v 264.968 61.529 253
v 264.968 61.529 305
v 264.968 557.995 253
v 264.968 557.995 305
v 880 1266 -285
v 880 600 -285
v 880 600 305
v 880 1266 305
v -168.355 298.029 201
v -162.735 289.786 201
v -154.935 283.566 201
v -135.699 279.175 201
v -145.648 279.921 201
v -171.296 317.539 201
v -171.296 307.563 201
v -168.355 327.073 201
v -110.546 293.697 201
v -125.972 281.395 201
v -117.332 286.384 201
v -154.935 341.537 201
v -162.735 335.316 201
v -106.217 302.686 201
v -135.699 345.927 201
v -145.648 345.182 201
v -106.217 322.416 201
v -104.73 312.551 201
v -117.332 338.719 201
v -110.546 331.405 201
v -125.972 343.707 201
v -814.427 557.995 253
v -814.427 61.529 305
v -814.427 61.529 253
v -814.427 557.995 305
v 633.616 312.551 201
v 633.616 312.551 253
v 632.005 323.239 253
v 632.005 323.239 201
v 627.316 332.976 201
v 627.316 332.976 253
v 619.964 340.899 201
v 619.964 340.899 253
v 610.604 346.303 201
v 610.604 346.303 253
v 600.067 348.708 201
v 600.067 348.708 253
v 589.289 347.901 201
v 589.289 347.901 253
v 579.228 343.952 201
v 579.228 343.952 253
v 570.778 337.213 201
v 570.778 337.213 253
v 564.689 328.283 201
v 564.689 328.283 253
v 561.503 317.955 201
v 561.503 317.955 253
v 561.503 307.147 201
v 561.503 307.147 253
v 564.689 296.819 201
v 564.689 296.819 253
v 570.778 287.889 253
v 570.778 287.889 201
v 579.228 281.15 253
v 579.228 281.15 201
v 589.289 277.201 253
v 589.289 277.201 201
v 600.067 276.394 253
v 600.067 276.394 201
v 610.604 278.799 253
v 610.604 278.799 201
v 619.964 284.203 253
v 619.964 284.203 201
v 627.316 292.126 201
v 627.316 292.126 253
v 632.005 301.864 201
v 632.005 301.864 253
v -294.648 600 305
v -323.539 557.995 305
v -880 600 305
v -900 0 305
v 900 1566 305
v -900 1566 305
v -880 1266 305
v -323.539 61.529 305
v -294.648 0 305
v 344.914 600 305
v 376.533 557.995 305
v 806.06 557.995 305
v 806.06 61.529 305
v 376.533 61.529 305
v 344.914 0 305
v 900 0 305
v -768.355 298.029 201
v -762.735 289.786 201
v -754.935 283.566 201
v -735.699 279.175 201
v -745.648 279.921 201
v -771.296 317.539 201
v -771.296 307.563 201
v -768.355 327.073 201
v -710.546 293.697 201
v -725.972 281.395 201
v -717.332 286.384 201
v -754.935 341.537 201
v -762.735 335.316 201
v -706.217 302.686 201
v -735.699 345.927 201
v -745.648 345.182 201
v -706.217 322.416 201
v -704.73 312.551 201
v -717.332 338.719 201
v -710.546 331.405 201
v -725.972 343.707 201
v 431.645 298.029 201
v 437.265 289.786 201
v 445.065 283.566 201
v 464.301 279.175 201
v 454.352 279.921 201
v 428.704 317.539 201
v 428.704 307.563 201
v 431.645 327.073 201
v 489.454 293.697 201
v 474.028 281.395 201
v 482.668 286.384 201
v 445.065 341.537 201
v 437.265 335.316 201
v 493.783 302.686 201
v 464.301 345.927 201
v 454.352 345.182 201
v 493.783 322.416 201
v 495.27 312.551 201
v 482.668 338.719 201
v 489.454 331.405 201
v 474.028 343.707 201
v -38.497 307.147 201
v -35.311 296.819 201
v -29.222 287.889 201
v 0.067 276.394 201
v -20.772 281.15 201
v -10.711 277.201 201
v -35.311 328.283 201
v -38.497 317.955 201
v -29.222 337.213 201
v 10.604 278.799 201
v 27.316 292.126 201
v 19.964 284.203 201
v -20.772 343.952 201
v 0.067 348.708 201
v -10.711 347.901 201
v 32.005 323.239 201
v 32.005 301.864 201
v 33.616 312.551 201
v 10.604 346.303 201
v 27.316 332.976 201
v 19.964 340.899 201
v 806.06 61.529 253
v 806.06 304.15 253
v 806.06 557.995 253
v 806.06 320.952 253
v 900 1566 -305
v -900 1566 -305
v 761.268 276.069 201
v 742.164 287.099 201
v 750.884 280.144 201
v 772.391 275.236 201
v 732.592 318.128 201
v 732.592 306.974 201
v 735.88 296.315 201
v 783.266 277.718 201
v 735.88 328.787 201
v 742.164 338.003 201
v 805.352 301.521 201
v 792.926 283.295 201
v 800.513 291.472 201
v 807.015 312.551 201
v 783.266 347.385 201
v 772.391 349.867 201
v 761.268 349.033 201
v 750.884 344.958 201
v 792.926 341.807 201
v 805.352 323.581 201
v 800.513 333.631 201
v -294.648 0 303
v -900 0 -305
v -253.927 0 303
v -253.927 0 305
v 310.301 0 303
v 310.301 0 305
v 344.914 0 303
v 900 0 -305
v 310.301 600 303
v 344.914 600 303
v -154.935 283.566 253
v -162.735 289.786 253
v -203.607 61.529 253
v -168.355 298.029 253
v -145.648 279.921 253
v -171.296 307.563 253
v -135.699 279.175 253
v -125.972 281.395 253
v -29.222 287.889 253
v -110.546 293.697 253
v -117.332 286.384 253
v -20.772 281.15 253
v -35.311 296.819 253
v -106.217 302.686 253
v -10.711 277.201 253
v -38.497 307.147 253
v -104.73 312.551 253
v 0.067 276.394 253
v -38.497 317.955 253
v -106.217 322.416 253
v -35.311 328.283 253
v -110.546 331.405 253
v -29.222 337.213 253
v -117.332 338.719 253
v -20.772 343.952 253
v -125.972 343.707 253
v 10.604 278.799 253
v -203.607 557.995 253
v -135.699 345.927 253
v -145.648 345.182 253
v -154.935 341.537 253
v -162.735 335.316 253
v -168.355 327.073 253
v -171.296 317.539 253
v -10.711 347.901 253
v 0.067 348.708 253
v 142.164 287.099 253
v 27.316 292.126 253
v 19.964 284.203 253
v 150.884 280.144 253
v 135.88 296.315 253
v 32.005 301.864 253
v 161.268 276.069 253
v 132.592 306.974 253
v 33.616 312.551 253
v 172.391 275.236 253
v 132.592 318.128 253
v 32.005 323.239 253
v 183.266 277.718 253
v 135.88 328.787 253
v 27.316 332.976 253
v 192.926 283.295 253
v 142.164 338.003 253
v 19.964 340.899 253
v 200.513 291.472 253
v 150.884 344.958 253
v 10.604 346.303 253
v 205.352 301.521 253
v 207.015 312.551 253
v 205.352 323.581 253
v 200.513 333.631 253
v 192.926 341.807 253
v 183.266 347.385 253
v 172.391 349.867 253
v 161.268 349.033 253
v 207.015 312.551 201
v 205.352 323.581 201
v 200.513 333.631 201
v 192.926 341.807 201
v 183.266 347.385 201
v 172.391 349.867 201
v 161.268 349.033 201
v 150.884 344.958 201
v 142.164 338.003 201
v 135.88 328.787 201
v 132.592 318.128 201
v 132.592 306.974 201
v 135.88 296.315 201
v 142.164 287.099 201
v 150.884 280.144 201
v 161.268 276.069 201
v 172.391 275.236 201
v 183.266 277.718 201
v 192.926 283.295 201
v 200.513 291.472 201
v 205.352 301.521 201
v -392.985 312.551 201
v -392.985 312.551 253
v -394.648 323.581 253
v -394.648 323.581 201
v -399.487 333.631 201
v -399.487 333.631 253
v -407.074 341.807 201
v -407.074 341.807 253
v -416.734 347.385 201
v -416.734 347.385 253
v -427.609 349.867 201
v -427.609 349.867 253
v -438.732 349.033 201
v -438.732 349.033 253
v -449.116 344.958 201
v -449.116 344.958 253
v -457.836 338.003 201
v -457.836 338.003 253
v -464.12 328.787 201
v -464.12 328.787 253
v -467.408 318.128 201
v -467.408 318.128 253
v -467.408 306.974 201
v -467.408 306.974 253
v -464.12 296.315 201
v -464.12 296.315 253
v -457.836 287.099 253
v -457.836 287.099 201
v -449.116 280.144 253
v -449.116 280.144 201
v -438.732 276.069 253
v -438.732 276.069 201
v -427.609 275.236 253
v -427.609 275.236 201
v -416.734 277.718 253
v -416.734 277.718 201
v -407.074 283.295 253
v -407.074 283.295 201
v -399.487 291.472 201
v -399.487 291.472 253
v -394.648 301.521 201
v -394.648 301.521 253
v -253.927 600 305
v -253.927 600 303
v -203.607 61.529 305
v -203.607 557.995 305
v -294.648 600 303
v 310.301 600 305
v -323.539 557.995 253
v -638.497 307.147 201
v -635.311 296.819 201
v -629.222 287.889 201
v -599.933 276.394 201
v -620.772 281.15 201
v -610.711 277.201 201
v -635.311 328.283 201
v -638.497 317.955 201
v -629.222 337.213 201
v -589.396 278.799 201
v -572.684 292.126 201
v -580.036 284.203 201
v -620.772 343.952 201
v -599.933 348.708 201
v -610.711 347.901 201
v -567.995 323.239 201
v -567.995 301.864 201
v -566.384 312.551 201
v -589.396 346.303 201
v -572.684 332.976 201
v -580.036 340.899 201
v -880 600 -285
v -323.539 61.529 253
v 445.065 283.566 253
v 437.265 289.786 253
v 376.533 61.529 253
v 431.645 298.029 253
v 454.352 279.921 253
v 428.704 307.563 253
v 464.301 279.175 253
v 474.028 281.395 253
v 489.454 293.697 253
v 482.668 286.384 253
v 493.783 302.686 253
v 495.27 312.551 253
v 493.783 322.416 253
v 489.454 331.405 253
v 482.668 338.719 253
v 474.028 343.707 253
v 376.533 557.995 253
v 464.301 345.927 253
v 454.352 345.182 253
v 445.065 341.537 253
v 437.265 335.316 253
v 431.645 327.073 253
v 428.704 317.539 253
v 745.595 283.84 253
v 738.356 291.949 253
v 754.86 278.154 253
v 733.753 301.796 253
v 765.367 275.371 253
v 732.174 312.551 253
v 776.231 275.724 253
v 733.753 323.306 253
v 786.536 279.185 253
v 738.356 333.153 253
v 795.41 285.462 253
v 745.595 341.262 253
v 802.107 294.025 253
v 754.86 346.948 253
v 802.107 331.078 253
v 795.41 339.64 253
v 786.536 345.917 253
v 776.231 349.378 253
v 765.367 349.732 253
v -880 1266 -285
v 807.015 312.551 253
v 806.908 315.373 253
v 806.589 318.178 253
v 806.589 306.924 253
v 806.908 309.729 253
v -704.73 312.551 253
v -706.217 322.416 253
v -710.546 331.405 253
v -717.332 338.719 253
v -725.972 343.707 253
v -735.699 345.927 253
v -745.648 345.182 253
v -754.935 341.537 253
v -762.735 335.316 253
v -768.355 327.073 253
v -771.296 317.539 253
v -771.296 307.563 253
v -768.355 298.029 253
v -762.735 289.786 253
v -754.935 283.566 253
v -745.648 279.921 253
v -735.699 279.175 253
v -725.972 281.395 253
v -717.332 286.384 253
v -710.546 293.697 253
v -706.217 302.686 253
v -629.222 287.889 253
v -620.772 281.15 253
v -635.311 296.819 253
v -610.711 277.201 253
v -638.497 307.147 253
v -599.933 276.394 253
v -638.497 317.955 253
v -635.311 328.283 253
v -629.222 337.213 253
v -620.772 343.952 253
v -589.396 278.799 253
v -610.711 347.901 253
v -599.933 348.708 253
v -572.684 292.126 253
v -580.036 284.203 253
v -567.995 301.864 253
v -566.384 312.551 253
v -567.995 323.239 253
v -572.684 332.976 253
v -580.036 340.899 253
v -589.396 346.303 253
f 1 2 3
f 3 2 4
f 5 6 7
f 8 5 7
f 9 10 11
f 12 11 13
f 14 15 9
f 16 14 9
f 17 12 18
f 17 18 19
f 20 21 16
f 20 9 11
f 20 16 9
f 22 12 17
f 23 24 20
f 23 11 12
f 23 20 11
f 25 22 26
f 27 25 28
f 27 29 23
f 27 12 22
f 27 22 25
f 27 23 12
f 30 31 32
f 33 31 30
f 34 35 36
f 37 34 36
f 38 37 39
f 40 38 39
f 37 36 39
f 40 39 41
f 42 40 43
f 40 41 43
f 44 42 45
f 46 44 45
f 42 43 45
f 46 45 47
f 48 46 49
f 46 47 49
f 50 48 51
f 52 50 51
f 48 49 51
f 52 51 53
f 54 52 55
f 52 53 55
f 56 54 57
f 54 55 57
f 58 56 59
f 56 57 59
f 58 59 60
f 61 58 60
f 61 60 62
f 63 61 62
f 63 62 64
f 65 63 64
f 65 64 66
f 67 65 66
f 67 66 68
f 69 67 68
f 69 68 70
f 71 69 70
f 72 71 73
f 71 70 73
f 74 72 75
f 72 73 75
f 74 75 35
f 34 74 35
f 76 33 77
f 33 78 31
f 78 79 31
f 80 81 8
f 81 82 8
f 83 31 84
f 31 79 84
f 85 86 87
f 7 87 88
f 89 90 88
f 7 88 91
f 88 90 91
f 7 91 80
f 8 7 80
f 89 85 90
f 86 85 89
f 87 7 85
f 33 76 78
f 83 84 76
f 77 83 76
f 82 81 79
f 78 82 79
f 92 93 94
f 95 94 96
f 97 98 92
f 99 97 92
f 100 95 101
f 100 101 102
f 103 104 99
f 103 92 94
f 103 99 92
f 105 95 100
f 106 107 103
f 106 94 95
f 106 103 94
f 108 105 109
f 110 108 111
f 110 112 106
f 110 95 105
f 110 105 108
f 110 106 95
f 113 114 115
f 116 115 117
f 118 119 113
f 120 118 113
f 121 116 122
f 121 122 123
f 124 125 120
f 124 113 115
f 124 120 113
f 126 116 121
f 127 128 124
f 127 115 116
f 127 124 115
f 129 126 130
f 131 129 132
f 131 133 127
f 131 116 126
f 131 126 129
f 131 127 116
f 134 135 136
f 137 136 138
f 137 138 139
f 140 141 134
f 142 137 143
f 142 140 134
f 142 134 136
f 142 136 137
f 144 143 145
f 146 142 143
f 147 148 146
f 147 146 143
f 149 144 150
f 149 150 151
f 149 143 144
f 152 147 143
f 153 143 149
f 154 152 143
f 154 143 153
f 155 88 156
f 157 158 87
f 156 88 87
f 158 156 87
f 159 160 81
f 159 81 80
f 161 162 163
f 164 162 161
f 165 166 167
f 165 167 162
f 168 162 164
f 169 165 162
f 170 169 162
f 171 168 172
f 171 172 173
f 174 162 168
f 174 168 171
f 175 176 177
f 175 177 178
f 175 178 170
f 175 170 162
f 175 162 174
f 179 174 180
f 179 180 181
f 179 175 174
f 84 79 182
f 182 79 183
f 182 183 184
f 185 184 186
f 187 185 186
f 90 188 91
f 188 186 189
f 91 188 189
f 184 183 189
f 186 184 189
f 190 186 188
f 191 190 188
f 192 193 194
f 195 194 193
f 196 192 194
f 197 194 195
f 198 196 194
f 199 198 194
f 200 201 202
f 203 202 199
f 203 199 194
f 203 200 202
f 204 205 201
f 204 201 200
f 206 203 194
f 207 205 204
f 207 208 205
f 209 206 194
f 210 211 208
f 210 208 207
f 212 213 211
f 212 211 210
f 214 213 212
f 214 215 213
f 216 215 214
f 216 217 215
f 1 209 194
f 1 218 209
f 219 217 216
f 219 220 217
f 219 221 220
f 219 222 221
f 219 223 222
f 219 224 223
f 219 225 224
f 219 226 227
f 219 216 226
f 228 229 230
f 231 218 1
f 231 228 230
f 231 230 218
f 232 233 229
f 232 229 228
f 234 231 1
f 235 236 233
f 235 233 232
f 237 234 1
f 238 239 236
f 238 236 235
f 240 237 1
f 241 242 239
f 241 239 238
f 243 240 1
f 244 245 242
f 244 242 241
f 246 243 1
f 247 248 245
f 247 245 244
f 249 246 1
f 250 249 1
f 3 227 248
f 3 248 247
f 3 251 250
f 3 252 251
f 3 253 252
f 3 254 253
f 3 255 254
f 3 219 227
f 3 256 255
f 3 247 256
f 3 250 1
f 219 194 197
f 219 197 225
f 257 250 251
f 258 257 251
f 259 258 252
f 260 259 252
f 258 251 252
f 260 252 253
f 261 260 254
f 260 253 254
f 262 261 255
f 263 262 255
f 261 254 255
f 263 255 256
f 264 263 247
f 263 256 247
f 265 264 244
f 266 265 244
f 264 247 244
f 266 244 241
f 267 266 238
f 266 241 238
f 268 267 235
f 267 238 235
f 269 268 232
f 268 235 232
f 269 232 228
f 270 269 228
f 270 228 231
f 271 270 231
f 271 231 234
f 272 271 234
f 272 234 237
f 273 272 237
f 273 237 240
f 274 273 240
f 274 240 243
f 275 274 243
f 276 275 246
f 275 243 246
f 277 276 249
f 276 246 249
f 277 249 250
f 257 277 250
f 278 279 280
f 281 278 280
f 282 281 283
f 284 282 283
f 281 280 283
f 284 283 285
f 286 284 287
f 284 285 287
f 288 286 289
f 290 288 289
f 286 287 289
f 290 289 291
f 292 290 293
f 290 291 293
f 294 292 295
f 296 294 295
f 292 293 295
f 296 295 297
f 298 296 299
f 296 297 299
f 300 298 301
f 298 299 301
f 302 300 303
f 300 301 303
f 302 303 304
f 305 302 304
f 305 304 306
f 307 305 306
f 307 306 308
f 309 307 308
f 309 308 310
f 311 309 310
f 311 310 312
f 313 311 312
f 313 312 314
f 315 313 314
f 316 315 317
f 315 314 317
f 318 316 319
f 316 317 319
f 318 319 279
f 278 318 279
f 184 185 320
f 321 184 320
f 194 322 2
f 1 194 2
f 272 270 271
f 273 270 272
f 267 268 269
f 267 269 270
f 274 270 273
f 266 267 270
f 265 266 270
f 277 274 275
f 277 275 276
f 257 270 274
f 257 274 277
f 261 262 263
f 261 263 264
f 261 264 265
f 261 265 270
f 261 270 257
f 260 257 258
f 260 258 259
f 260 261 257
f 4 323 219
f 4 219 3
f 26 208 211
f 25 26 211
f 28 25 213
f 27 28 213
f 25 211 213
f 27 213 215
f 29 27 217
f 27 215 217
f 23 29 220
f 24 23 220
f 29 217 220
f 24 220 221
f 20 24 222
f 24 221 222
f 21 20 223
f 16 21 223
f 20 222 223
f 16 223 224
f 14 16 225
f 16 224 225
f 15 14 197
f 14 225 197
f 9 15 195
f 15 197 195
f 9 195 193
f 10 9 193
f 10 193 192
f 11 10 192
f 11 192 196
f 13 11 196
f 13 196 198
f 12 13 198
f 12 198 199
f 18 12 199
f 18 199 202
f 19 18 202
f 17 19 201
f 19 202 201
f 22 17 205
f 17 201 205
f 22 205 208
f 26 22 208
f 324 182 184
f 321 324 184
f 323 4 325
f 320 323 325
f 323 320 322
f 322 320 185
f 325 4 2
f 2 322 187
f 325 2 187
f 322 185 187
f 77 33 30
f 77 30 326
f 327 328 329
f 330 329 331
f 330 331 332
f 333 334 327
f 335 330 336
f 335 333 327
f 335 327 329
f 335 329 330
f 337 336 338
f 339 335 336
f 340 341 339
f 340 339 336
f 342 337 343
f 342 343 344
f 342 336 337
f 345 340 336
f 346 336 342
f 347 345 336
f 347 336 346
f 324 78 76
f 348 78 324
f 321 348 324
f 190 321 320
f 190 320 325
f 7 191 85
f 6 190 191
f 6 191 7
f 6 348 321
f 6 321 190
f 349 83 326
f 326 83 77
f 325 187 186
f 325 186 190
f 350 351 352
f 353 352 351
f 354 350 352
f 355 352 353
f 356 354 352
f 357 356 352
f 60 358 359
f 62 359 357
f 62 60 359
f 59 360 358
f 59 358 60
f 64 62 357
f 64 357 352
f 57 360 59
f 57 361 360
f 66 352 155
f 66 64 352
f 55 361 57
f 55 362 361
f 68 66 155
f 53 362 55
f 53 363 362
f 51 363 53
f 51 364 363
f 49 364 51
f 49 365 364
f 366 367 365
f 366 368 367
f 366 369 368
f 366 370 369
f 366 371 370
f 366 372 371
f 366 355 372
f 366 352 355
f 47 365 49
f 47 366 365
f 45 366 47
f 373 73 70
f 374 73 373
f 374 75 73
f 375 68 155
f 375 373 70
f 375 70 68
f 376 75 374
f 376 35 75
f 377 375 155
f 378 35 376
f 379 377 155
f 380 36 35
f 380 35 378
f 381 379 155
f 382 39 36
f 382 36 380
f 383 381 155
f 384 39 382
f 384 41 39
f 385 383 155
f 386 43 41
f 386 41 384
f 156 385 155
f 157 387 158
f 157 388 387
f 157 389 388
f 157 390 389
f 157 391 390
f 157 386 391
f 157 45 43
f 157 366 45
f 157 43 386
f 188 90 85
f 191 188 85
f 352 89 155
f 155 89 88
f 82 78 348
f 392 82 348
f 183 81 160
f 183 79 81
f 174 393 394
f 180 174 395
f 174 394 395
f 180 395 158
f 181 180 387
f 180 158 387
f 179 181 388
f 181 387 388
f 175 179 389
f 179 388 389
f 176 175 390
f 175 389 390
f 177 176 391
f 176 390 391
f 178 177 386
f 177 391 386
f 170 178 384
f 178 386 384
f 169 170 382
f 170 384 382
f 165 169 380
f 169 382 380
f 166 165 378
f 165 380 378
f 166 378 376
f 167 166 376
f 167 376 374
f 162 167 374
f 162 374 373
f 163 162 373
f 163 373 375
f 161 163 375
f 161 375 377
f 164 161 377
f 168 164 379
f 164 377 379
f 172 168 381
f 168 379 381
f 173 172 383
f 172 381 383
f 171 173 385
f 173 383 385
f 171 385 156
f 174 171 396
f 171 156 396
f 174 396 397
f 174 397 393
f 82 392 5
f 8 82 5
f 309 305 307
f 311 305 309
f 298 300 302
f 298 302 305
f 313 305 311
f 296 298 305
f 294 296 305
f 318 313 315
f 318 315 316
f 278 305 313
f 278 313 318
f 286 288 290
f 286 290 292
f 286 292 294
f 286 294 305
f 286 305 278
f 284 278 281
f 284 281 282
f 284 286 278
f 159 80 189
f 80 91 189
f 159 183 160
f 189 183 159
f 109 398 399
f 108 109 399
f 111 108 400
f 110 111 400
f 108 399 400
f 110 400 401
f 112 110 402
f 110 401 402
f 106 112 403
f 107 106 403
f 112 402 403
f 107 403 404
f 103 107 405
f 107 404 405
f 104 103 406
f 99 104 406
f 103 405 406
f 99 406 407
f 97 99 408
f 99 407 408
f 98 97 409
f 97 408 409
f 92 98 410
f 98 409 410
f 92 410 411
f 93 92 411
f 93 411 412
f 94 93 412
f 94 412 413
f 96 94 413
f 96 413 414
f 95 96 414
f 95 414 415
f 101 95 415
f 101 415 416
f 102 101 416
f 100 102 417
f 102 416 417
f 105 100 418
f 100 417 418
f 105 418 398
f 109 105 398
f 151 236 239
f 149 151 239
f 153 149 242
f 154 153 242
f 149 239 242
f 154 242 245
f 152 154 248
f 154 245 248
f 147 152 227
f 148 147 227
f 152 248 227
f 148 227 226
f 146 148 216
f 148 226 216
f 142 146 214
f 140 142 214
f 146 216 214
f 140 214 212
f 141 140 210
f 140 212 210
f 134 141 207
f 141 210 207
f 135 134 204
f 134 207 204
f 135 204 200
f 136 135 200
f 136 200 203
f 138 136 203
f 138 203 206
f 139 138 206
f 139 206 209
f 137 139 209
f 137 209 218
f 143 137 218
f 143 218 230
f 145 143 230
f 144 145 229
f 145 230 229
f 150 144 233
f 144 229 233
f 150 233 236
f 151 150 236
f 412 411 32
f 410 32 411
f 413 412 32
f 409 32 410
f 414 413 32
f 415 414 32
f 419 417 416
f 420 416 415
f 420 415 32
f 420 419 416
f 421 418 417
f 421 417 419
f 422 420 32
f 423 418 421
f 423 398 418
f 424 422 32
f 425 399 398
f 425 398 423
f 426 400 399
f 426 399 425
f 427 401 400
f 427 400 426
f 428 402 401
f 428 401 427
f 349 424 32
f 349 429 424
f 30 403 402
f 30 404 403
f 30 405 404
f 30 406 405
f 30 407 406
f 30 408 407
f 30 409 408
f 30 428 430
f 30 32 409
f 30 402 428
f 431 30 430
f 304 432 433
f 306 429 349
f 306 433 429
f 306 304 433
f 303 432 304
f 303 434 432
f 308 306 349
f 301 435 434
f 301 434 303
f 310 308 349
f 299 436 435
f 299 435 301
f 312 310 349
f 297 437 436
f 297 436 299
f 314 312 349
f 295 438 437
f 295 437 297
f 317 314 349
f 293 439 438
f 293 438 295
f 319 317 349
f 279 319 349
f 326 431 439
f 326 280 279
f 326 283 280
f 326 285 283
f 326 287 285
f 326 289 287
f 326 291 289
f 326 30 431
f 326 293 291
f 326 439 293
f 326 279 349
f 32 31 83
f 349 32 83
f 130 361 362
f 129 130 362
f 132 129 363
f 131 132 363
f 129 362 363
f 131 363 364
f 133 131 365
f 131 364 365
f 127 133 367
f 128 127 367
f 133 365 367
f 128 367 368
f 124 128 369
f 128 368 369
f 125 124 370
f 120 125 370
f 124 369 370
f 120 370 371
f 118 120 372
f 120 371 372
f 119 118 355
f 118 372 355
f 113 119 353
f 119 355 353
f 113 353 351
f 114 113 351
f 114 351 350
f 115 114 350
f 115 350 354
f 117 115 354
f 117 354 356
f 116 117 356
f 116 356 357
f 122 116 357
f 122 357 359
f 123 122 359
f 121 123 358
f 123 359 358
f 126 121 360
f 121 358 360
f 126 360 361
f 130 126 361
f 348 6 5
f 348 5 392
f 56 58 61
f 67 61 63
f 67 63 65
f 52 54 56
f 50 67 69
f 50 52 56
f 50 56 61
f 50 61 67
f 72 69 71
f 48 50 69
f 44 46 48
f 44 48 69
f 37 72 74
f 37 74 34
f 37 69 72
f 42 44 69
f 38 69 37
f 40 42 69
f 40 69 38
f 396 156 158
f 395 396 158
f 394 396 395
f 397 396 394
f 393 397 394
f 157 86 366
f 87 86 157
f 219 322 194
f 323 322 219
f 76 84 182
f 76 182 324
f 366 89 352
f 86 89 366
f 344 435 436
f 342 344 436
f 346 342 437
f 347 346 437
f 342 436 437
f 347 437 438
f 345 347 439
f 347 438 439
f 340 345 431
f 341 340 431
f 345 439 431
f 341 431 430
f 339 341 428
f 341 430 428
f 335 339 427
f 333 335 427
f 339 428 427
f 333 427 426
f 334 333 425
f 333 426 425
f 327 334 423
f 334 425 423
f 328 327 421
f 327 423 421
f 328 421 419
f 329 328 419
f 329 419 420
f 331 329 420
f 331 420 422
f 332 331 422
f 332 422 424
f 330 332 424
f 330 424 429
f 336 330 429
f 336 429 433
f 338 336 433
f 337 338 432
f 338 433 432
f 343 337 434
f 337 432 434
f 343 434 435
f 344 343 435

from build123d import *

# Parameters (mm, degrees)
CROQUIS1_W              = 1800
CROQUIS1_H              = 610
SALIENTE_EXTRUIR1_DEPTH = 600
CROQUIS2_W              = 40.721486725
CROQUIS2_H              = 600
CROQUIS2_W_2            = 34.613400616
CORTAR_EXTRUIR1_DEPTH   = 2
CROQUIS3_W              = 490.887470824
CROQUIS3_H              = 496.465737538
CROQUIS3_W_2            = 468.574403969
CROQUIS3_W_3            = 429.526536971
CORTAR_EXTRUIR2_DEPTH   = 52
CROQUIS4_R              = 33.469600283
CROQUIS4_R_2            = 36.25873364
CROQUIS4_R_3            = 37.420150707
CORTAR_EXTRUIR3_DEPTH   = 52
MATRIZL1_COUNT          = 3
MATRIZL1_PITCH          = 600
SALIENTE_EXTRUIR2_DEPTH = 666
CROQUIS6_W              = 1800
CROQUIS6_H              = 610
SALIENTE_EXTRUIR3_DEPTH = 300


with BuildPart() as part:
    # Croquis1 → Saliente-Extruir1 (new body)
    with BuildSketch(Plane(origin=(0, 0, 0), x_dir=(1, 0, 0), z_dir=(0, 1, 0))):
        Rectangle(CROQUIS1_W, CROQUIS1_H)
    extrude(amount=SALIENTE_EXTRUIR1_DEPTH)

    # Croquis2 → Cortar-Extruir1 (cut)
    with BuildSketch(Plane.XY.offset(305)):
        with Locations((-274.287558023, 300)):
            Rectangle(CROQUIS2_W, CROQUIS2_H)
        with Locations((327.607420408, 300)):
            Rectangle(CROQUIS2_W_2, CROQUIS2_H)
    extrude(amount=-CORTAR_EXTRUIR1_DEPTH, mode=Mode.SUBTRACT)

    # Croquis3 → Cortar-Extruir2 (cut)
    with BuildSketch(Plane.XY.offset(305)):
        with Locations((-568.983204819, 309.761966749)):
            Rectangle(CROQUIS3_W, CROQUIS3_H)
        with Locations((30.680466927, 309.761966749)):
            Rectangle(CROQUIS3_W_2, CROQUIS3_H)
        with Locations((591.296271675, 309.761966749)):
            Rectangle(CROQUIS3_W_3, CROQUIS3_H)
    extrude(amount=-CORTAR_EXTRUIR2_DEPTH, mode=Mode.SUBTRACT)

    # Croquis4 → Cortar-Extruir3 (cut)
    with BuildSketch(Plane.XY.offset(253)):
        with Locations((-738.199956824, 312.551100106)):
            Circle(CROQUIS4_R)
        with Locations((-602.642790268, 312.551100106)):
            Circle(CROQUIS4_R_2)
        with Locations((-430.405449232, 312.551100106)):
            Circle(CROQUIS4_R_3)
    cortar_extruir3 = extrude(amount=-CORTAR_EXTRUIR3_DEPTH, mode=Mode.SUBTRACT)

    # MatrizL1: Cortar-Extruir3 ×3
    with Locations(*[(i * MATRIZL1_PITCH, 0, 0) for i in range(1, MATRIZL1_COUNT)]):
        add(cortar_extruir3, mode=Mode.SUBTRACT)

    # Croquis5 → Saliente-Extruir2 (add)
    with BuildSketch(Plane(origin=(0, 600, 0), x_dir=(1, 0, 0), z_dir=(0, 1, 0))):
        Polygon((900, -305), (880, -305), (880, -285), (880, 285), (-880, 285), (-880, -285), (-880, -305), (-900, -305), (-900, 305), (900, 305), align=None)
    extrude(amount=SALIENTE_EXTRUIR2_DEPTH)

    # Croquis6 → Saliente-Extruir3 (add)
    with BuildSketch(Plane(origin=(0, 1266, 0), x_dir=(1, 0, 0), z_dir=(0, 1, 0))):
        Rectangle(CROQUIS6_W, CROQUIS6_H)
    extrude(amount=SALIENTE_EXTRUIR3_DEPTH)


solid = part.part
